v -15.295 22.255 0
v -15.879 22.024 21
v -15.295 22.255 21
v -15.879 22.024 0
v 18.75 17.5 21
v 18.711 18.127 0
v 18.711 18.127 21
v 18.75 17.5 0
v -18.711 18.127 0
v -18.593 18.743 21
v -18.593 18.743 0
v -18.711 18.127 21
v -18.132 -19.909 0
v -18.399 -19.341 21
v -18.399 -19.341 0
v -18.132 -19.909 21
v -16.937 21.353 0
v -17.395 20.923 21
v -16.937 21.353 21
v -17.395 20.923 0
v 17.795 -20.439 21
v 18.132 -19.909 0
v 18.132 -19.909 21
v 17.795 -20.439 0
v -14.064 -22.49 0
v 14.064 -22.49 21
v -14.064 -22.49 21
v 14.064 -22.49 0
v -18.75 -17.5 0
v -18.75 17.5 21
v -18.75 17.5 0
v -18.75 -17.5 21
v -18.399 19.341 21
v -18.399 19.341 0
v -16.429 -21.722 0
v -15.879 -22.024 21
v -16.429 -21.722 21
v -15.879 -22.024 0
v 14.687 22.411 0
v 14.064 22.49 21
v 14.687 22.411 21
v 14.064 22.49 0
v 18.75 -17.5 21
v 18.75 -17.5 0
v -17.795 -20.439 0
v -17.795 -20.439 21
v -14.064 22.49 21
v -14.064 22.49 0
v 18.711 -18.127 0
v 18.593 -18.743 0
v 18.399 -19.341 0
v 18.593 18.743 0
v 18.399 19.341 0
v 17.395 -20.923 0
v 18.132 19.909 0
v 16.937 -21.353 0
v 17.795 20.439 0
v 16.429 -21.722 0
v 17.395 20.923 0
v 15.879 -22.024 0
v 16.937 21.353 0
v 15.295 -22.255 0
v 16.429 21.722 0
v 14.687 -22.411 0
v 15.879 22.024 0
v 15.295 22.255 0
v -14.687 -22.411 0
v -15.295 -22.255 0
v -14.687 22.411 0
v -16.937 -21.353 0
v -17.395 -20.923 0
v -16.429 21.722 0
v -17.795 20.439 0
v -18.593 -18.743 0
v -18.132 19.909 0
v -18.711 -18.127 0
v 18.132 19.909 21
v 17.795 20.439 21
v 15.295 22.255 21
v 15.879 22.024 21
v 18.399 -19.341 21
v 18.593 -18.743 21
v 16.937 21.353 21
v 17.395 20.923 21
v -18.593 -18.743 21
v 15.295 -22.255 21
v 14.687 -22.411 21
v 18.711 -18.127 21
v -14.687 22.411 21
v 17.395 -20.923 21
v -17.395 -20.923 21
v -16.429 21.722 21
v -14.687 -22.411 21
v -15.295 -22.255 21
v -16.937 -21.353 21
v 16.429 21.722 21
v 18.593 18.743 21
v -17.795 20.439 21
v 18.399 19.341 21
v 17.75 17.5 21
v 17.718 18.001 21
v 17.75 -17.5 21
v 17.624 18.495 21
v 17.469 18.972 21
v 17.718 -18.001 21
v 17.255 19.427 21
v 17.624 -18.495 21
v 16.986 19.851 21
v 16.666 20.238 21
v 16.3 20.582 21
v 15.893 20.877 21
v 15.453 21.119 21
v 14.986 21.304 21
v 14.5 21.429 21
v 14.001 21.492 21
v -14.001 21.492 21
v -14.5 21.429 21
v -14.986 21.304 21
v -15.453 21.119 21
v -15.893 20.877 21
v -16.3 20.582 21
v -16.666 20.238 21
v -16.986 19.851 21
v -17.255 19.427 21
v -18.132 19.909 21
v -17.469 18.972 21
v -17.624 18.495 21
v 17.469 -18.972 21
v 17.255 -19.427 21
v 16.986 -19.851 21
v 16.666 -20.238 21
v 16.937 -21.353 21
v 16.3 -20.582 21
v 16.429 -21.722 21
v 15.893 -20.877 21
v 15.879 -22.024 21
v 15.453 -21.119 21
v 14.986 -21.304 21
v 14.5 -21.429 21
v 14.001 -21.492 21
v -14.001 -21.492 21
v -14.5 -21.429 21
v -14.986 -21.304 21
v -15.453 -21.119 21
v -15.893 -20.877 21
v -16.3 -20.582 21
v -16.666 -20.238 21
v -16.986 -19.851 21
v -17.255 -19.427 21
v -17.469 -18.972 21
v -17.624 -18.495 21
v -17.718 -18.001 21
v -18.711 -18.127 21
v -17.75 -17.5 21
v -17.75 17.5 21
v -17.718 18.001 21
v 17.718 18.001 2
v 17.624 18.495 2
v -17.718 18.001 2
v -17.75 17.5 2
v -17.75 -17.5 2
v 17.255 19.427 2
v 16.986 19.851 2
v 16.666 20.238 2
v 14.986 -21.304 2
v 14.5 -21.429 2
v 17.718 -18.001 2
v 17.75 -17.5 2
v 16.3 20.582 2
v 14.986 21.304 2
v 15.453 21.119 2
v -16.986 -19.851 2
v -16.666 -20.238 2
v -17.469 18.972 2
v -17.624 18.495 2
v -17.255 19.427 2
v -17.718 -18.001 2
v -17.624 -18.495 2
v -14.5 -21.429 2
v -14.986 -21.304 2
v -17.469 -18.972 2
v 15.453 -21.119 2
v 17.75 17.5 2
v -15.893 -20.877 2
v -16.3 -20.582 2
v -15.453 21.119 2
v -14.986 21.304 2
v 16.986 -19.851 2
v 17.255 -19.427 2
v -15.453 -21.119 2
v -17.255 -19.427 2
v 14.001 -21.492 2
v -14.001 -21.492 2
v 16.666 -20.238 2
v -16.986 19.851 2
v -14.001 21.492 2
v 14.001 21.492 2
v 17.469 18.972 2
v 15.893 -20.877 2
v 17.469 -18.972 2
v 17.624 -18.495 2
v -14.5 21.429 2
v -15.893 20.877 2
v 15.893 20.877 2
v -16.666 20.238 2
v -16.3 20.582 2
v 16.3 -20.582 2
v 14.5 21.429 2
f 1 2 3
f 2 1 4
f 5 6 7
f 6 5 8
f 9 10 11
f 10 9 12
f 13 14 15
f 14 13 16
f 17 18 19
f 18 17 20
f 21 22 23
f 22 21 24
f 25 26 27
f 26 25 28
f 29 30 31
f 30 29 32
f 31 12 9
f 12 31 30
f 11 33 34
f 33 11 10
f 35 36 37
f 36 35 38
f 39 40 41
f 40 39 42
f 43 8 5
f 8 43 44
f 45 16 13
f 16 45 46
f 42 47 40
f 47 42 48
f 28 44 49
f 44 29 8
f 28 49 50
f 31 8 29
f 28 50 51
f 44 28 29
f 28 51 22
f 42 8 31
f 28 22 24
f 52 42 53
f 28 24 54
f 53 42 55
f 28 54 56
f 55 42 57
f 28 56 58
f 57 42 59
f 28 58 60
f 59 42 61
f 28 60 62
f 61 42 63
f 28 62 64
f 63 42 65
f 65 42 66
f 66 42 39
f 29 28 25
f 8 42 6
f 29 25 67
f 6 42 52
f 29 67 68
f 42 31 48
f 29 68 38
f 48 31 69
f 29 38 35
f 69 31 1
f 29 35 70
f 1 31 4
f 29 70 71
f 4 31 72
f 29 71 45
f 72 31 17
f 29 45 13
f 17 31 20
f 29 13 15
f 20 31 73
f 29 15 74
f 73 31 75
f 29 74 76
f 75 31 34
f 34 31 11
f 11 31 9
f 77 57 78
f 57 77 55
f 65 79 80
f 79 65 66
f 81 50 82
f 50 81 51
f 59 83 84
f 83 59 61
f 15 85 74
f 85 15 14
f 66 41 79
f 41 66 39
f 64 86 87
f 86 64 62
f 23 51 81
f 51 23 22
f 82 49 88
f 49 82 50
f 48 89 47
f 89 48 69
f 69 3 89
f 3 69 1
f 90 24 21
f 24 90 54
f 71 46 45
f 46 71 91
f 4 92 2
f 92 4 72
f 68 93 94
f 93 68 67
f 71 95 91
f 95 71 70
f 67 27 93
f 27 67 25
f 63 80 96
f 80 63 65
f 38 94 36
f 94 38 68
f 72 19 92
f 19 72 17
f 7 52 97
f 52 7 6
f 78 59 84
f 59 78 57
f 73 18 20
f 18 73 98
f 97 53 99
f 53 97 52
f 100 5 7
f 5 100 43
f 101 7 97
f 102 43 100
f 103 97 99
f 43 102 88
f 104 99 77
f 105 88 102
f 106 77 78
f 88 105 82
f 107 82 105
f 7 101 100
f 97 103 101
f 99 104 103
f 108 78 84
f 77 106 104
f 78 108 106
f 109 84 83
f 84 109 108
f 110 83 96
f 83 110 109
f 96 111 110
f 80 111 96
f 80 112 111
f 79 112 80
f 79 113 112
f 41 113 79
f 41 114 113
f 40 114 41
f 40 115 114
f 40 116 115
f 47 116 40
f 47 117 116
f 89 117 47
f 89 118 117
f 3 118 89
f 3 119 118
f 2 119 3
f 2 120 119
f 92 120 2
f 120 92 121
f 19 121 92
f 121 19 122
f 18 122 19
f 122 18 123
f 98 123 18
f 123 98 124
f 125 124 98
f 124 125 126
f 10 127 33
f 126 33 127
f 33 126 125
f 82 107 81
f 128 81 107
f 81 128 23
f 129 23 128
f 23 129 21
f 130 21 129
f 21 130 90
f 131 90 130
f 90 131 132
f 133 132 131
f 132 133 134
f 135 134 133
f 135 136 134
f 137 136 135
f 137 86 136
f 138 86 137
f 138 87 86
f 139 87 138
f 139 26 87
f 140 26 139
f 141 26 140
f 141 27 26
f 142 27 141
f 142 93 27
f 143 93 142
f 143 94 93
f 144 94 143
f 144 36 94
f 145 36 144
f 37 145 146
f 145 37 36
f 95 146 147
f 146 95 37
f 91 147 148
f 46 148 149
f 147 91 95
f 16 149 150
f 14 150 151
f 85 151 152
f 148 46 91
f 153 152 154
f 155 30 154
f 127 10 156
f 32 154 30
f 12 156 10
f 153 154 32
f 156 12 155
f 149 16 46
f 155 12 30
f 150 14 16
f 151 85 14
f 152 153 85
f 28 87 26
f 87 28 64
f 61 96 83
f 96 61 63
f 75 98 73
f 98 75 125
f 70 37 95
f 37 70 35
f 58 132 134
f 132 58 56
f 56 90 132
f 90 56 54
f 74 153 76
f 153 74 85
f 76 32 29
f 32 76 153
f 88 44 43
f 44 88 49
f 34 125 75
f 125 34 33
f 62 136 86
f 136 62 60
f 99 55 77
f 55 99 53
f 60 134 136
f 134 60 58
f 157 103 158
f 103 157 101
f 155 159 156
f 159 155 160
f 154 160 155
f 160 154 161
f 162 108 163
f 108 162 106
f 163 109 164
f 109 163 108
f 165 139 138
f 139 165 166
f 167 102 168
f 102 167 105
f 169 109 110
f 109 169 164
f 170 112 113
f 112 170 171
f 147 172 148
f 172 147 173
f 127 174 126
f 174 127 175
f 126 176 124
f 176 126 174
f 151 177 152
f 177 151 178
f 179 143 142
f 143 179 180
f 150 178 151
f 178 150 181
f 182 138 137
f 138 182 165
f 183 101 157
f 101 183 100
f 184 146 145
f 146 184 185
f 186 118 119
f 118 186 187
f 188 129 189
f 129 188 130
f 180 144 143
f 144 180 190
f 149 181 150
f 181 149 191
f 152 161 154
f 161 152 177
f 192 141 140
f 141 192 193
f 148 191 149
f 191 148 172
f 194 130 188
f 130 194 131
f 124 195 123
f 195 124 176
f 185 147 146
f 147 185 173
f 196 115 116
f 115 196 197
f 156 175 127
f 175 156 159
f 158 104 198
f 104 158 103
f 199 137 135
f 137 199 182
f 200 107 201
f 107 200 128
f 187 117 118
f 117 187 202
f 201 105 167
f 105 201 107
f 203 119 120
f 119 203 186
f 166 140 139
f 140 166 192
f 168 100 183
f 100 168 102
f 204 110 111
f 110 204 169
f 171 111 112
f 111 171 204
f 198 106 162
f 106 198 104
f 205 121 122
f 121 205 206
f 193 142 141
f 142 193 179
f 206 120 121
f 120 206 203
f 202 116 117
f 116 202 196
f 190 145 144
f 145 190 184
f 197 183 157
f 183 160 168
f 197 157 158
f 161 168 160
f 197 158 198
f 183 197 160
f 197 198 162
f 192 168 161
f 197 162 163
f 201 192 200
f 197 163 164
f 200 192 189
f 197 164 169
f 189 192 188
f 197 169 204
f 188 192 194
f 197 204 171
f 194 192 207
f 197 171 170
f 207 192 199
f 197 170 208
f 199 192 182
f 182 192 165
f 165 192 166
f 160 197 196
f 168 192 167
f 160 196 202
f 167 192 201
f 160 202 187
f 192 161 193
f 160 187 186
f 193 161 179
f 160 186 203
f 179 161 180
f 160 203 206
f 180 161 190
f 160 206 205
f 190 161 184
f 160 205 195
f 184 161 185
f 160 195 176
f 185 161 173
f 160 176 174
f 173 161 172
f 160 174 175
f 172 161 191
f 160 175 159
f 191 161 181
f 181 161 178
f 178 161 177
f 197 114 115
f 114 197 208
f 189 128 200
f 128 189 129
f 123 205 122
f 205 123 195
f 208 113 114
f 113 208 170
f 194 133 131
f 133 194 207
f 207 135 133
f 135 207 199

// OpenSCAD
$fn = 50;


difference() {
	union() {
		hull() {
			translate(v = [-13.7500000000, 17.5000000000, 0]) {
				cylinder(h = 21, r = 5);
			}
			translate(v = [13.7500000000, 17.5000000000, 0]) {
				cylinder(h = 21, r = 5);
			}
			translate(v = [-13.7500000000, -17.5000000000, 0]) {
				cylinder(h = 21, r = 5);
			}
			translate(v = [13.7500000000, -17.5000000000, 0]) {
				cylinder(h = 21, r = 5);
			}
		}
	}
	union() {
		translate(v = [0, 0, 2]) {
			hull() {
				translate(v = [-13.7500000000, 17.5000000000, 0]) {
					cylinder(h = 19, r = 4);
				}
				translate(v = [13.7500000000, 17.5000000000, 0]) {
					cylinder(h = 19, r = 4);
				}
				translate(v = [-13.7500000000, -17.5000000000, 0]) {
					cylinder(h = 19, r = 4);
				}
				translate(v = [13.7500000000, -17.5000000000, 0]) {
					cylinder(h = 19, r = 4);
				}
			}
		}
	}
}
